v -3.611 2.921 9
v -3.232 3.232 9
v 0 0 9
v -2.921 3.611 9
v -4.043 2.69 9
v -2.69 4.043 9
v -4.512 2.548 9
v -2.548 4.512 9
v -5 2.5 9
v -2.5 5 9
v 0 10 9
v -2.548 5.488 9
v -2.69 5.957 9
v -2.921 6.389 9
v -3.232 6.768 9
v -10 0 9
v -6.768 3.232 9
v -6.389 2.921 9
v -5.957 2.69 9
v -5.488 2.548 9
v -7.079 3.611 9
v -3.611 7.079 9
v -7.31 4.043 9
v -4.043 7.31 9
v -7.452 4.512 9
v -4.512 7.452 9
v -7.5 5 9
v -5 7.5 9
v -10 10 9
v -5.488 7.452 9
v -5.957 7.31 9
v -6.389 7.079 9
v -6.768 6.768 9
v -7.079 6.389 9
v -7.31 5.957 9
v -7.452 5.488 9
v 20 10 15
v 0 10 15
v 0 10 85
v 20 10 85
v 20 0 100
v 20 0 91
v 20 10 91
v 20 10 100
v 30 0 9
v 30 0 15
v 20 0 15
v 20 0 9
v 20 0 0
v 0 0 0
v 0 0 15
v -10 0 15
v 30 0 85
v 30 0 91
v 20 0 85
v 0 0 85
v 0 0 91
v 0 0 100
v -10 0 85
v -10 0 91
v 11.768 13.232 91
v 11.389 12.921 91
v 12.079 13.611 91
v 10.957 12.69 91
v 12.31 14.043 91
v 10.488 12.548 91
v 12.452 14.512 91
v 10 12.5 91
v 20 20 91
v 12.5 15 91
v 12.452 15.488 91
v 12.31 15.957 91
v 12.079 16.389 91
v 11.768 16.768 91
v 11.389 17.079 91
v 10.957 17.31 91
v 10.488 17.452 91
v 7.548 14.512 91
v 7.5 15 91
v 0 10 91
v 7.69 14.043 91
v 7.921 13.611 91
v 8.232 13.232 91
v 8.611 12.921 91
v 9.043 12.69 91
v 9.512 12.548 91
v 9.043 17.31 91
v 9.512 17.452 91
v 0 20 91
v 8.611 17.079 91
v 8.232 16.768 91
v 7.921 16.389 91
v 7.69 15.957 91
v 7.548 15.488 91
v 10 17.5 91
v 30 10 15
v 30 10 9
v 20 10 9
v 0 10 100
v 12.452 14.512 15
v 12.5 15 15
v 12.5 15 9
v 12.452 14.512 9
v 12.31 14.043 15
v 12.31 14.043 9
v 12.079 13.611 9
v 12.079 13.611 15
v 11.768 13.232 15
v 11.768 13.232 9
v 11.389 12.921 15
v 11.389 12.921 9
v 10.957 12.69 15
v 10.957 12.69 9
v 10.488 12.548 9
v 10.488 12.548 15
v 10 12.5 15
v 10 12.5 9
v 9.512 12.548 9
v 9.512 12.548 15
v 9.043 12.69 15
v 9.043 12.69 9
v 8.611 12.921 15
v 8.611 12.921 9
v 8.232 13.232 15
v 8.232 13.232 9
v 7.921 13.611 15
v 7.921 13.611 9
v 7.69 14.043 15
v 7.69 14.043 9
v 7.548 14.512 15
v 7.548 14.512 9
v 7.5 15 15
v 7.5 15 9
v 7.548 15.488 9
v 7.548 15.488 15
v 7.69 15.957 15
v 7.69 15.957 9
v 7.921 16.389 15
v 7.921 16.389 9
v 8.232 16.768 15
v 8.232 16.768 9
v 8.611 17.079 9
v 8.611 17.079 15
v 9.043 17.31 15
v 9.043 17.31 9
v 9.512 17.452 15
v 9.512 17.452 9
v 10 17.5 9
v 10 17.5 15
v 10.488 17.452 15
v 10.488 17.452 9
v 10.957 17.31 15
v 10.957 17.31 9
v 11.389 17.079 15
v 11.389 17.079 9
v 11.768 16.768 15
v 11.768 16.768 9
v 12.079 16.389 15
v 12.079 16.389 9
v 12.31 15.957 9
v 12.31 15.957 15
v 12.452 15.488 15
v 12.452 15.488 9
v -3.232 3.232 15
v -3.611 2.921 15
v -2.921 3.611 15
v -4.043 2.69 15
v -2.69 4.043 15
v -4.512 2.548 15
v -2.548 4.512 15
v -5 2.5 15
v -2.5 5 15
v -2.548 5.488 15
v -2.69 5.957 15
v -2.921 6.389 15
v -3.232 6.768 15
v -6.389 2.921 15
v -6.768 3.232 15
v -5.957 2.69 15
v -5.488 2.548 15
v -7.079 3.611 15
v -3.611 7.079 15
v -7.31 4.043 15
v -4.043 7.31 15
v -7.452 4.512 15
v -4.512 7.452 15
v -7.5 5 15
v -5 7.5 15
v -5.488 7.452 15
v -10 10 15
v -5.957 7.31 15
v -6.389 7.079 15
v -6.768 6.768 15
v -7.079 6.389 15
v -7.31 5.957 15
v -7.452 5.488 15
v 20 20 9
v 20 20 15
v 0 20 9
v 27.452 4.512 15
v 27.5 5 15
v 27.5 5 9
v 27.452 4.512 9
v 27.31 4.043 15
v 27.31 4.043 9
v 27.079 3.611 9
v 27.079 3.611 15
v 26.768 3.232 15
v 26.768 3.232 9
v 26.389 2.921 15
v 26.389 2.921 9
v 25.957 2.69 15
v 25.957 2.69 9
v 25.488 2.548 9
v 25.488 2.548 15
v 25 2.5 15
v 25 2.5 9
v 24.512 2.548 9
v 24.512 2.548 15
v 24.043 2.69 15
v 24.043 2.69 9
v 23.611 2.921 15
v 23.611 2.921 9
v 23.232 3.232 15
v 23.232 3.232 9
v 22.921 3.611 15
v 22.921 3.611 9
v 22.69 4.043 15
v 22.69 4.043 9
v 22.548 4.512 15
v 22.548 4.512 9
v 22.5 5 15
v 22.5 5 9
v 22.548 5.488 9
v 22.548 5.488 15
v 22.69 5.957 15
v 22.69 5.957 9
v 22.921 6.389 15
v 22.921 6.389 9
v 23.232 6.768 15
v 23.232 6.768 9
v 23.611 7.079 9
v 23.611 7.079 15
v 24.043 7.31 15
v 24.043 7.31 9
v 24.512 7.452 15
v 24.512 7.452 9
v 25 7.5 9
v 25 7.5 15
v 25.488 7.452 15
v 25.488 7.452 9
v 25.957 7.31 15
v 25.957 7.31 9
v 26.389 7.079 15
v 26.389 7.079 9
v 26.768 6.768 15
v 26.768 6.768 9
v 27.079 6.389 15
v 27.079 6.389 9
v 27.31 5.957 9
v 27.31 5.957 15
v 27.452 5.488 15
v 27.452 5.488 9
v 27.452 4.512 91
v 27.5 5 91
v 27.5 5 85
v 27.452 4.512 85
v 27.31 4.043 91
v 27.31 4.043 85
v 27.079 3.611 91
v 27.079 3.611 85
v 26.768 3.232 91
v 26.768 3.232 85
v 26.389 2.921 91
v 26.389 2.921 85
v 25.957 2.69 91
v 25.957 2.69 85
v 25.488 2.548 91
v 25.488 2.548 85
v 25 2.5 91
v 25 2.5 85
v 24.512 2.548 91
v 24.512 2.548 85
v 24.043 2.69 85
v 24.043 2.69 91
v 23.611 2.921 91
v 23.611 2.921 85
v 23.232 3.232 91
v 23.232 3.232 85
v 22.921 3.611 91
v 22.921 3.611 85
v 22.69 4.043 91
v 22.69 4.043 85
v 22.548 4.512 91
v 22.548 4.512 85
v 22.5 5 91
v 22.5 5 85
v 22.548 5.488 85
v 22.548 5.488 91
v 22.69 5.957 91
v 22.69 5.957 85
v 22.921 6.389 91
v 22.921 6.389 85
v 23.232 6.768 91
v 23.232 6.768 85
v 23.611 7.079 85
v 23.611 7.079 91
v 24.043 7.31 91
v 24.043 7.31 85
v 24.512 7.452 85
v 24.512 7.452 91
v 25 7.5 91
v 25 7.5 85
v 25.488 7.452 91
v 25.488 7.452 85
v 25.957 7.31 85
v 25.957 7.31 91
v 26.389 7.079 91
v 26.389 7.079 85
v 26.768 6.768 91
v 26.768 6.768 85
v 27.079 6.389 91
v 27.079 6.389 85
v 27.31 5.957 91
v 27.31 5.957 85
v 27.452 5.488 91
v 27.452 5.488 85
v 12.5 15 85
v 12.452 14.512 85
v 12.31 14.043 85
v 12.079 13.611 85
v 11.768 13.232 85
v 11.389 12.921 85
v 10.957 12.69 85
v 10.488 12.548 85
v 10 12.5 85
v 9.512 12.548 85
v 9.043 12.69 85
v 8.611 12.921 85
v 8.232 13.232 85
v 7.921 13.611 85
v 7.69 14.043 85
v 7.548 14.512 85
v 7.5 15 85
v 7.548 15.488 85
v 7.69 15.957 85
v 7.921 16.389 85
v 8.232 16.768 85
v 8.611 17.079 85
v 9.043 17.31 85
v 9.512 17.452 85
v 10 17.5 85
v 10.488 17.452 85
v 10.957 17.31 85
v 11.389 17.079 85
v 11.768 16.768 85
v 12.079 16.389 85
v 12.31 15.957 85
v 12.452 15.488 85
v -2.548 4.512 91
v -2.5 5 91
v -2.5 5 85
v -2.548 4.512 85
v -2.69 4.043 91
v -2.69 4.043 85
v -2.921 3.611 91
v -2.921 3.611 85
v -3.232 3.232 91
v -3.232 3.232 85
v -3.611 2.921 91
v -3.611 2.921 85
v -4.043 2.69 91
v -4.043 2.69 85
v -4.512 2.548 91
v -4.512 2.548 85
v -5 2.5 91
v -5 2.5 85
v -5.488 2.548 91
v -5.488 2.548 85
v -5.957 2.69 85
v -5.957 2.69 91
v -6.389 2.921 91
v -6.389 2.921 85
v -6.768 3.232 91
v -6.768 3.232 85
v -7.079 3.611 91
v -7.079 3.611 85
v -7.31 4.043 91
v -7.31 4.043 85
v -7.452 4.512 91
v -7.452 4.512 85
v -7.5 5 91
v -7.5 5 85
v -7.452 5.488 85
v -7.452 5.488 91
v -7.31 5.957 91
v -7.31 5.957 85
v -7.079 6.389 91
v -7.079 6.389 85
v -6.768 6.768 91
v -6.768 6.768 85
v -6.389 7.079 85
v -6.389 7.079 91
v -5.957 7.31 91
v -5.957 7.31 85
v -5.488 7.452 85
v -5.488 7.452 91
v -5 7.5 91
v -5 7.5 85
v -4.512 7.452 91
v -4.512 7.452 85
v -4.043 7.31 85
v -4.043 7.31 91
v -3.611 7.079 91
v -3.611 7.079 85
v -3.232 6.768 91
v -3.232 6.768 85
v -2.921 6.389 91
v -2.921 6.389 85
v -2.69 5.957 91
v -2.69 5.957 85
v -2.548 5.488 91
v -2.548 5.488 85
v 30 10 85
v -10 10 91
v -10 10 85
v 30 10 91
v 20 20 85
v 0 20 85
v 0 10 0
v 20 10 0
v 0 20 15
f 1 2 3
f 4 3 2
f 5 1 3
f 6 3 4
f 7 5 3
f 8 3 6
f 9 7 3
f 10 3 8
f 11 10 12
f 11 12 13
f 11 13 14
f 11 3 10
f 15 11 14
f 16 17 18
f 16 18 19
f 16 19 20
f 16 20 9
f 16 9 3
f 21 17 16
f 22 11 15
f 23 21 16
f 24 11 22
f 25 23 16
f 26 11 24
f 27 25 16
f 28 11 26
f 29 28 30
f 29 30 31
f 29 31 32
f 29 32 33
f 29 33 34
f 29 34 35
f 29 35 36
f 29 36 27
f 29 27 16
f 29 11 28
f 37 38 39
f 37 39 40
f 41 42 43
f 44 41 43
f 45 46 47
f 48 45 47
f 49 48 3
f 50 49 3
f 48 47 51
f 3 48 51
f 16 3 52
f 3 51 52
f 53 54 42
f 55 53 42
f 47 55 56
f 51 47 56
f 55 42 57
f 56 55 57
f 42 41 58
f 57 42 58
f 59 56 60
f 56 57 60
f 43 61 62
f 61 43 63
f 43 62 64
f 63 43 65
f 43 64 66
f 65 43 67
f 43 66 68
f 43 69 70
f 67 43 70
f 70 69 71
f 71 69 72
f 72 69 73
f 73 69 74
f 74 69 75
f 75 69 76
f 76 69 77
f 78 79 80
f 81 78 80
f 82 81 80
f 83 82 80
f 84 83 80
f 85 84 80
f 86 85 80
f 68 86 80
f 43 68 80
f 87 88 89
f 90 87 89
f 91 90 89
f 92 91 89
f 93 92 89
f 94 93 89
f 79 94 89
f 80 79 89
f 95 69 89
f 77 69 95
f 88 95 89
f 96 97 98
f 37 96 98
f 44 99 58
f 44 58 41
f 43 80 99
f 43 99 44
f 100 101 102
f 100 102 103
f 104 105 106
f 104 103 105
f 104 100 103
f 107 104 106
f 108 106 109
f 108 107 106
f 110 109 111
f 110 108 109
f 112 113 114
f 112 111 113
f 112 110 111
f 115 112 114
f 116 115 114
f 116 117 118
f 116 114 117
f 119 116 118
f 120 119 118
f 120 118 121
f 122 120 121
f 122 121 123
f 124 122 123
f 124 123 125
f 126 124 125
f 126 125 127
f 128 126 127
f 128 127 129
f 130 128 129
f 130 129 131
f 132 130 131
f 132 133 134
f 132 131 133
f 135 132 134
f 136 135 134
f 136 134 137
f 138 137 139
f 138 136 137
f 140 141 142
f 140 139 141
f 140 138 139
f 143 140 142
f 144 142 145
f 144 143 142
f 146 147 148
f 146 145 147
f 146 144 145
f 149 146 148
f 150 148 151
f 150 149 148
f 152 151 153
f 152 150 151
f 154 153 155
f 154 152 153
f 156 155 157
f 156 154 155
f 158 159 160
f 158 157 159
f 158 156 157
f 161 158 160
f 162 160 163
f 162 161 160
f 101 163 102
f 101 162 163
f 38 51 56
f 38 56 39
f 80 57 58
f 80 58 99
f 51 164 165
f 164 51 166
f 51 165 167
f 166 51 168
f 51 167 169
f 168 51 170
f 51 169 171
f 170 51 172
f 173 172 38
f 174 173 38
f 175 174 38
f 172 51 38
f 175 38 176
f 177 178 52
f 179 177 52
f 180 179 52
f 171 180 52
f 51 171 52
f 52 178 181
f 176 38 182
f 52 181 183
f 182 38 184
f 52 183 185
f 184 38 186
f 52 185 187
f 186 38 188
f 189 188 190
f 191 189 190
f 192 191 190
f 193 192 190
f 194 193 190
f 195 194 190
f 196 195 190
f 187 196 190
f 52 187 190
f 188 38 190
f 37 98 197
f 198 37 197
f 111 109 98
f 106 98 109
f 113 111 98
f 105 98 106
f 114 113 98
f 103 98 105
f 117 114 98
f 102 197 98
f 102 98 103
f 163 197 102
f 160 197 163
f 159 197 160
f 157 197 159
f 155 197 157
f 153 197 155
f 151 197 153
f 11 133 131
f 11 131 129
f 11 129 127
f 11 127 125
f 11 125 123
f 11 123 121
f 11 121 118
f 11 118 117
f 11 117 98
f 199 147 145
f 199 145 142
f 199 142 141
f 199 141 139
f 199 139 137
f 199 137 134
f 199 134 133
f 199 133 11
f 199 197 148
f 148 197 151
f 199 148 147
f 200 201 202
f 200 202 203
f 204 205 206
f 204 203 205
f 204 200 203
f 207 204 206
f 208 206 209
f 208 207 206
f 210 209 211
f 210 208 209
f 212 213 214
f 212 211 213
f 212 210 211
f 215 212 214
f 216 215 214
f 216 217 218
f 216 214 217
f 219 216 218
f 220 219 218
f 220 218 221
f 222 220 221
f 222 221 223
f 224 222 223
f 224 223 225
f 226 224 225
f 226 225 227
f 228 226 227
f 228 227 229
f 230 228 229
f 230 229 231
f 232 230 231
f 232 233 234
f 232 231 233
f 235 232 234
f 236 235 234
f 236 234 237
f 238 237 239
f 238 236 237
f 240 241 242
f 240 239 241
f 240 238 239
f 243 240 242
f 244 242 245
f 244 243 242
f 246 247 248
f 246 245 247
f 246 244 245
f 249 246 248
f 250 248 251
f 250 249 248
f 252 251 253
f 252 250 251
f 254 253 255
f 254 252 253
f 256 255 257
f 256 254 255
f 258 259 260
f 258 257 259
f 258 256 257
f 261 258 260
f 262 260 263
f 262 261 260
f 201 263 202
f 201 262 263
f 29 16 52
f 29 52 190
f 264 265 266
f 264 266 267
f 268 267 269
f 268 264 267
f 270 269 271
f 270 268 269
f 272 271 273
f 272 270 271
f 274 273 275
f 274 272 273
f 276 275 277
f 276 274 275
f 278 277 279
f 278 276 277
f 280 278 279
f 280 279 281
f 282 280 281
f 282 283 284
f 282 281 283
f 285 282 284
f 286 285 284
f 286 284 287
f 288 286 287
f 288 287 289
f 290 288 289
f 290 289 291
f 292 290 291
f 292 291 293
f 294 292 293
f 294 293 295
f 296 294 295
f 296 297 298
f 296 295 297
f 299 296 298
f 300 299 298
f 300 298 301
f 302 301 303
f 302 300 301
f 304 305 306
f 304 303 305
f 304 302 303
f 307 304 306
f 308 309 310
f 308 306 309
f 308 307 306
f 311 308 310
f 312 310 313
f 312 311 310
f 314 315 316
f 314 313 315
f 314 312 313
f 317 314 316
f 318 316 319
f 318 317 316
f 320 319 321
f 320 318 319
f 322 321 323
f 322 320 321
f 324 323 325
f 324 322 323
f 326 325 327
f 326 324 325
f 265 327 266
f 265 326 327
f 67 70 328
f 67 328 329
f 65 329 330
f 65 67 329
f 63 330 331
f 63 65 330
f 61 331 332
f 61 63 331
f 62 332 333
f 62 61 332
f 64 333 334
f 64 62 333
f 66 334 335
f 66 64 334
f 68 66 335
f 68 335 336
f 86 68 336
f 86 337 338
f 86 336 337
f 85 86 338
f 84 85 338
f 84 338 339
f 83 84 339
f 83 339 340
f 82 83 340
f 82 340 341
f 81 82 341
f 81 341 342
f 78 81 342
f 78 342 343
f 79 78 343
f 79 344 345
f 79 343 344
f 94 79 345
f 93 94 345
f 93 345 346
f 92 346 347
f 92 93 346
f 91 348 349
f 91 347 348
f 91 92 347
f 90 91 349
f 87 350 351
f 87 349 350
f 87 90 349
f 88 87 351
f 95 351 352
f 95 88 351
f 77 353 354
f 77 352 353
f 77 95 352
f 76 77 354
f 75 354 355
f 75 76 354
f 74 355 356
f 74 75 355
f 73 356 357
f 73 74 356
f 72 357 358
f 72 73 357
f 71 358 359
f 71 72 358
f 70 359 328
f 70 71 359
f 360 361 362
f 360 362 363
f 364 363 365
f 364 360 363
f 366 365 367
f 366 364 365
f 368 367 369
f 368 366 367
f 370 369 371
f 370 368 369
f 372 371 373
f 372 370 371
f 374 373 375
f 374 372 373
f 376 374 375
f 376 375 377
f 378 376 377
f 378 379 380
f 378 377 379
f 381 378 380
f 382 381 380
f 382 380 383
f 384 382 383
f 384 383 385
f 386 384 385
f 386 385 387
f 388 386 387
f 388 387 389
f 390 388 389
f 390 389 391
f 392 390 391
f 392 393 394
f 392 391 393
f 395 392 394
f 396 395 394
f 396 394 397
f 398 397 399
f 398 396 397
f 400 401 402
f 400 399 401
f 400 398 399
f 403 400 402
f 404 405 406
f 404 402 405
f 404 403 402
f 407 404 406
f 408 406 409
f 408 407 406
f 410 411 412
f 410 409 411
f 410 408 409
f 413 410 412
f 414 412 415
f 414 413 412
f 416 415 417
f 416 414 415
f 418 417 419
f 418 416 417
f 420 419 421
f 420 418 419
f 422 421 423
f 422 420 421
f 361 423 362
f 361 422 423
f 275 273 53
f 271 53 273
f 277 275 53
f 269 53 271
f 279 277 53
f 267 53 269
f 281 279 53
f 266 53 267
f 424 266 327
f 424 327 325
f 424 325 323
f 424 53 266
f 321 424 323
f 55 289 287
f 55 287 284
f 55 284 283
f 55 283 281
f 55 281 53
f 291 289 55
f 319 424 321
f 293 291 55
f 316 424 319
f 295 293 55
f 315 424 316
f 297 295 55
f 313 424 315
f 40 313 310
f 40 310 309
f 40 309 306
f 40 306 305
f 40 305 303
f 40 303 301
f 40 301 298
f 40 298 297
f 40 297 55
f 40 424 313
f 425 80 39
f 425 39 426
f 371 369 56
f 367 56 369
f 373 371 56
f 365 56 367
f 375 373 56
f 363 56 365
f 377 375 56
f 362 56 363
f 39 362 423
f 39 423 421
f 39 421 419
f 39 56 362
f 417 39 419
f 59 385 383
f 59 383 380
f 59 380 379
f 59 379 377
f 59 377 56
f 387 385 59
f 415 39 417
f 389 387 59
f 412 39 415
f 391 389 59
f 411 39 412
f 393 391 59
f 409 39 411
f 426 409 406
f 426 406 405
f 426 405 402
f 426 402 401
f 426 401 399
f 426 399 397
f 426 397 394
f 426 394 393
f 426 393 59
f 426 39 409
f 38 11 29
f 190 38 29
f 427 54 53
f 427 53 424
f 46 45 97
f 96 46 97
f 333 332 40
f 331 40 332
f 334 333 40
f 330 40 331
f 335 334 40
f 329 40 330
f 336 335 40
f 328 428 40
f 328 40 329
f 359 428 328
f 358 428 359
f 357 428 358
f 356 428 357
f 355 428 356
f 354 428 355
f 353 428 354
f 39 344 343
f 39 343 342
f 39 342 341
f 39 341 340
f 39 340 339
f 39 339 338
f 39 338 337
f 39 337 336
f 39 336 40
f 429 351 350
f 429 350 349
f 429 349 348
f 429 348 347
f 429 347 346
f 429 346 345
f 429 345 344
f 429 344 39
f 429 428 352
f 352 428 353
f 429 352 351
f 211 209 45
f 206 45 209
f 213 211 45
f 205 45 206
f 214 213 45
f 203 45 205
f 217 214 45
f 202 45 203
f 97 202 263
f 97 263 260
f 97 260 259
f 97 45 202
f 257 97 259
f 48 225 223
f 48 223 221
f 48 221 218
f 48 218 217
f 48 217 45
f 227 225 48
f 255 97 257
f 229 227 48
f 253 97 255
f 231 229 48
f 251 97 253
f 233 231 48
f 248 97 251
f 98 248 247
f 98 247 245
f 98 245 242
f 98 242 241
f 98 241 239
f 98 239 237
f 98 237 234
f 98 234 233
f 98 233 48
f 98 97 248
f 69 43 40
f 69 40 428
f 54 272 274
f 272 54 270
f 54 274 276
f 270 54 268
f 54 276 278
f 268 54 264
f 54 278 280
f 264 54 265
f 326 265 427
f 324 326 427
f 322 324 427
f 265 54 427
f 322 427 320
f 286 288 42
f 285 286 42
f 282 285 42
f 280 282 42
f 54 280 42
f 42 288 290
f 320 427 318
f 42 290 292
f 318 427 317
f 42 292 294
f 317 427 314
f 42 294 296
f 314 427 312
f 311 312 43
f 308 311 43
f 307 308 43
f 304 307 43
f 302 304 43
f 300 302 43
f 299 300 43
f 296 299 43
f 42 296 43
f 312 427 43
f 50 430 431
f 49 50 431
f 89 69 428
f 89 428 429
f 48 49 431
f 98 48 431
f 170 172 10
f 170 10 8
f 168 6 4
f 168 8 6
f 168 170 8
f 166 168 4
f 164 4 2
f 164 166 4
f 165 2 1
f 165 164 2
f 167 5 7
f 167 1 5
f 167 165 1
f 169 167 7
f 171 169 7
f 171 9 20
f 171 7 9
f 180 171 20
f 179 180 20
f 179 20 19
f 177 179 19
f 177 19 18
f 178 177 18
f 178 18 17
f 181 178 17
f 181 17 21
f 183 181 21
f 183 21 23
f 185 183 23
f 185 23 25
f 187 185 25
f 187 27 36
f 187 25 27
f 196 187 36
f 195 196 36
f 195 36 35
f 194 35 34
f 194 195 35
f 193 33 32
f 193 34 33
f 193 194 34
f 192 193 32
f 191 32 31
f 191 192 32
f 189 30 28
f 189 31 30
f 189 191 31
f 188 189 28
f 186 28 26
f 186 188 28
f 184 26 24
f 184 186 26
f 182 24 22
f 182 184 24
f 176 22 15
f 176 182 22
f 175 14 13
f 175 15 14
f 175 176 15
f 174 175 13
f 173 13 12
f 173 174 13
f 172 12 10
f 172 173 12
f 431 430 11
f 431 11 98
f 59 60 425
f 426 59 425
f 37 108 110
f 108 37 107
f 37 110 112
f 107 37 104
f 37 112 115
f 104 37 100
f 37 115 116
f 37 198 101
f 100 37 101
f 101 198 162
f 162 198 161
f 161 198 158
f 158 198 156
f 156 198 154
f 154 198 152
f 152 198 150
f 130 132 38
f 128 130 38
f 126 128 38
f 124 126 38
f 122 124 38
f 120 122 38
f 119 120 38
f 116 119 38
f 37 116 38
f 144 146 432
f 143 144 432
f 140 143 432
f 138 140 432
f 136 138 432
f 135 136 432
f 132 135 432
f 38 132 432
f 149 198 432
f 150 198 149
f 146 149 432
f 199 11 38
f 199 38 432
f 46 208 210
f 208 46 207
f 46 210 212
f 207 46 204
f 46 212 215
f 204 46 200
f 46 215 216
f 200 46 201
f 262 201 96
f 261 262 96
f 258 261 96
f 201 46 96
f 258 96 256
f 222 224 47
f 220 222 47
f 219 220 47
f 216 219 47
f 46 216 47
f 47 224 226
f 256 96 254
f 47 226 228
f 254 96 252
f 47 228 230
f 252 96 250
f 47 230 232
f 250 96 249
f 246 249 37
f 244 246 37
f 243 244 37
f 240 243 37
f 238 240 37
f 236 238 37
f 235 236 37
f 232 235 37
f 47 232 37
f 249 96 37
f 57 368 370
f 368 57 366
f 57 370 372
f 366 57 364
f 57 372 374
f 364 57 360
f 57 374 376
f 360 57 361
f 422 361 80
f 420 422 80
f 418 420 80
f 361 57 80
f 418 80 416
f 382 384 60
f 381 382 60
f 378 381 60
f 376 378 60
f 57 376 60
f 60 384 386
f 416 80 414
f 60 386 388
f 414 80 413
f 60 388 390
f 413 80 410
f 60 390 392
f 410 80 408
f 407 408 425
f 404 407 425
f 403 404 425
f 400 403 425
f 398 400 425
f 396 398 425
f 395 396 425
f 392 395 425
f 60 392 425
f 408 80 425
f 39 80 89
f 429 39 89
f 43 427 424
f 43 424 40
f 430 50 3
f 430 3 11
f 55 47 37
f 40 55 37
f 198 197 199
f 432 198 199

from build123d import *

# Parameters (mm, degrees)
SKETCH_1_W               = 20
SKETCH_1_H               = 10
EXTRUDE_1_DEPTH          = 100
EXTRUDE_START            = -9
SKETCH_2_W               = 10
SKETCH_2_H               = 10
SKETCH_2_W_2             = 20
EXTRUDE_2_DEPTH          = 6
CUT_EXTRUDE_1_DEPTH      = 98.88258272
CUT_EXTRUDE_1_DEPTH_BACK = 98.88258272
SKETCH_3_R               = 2.5


with BuildPart() as part:
    # 草图1 → 凸台-拉伸1 (new body)
    with BuildSketch(Plane.XY):
        with Locations((10, 5)):
            Rectangle(SKETCH_1_W, SKETCH_1_H)
    extrude(amount=EXTRUDE_1_DEPTH)

    # 草图2 → 凸台-拉伸2 (add)
    with BuildSketch(Plane(origin=(0, 0, 0), x_dir=(-1, 0, 0), z_dir=(0, 0, -1)).offset(EXTRUDE_START)):
        with Locations((-25, 5)):
            Rectangle(SKETCH_2_W, SKETCH_2_H)
        with Locations((-10, 15)):
            Rectangle(SKETCH_2_W_2, SKETCH_2_H)
        with Locations((5, 5)):
            Rectangle(SKETCH_2_W, SKETCH_2_H)
    extrude_2 = extrude(amount=-EXTRUDE_2_DEPTH)

    # 镜向1: 凸台-拉伸2 across plane
    add(extrude_2.mirror(Plane(origin=(0, 0, 50), x_dir=(1, 0, 0), z_dir=(0, 0, -1))))

    # 草图3 → 切除-拉伸1 (cut, two sides: drawn at the far end of the back side and taken through both)
    with BuildSketch(Plane(origin=(0, 0, 9), x_dir=(-1, 0, 0), z_dir=(0, 0, -1)).offset(-CUT_EXTRUDE_1_DEPTH_BACK)):
        with Locations(Location((5, 5, 0), (0, 0, 180))):
            Circle(SKETCH_3_R)
        with Locations(Location((-10, 15, 0), (0, 0, 180))):
            Circle(SKETCH_3_R)
        with Locations(Location((-25, 5, 0), (0, 0, 180))):
            Circle(SKETCH_3_R)
    extrude(amount=CUT_EXTRUDE_1_DEPTH + CUT_EXTRUDE_1_DEPTH_BACK, mode=Mode.SUBTRACT)


solid = part.part
